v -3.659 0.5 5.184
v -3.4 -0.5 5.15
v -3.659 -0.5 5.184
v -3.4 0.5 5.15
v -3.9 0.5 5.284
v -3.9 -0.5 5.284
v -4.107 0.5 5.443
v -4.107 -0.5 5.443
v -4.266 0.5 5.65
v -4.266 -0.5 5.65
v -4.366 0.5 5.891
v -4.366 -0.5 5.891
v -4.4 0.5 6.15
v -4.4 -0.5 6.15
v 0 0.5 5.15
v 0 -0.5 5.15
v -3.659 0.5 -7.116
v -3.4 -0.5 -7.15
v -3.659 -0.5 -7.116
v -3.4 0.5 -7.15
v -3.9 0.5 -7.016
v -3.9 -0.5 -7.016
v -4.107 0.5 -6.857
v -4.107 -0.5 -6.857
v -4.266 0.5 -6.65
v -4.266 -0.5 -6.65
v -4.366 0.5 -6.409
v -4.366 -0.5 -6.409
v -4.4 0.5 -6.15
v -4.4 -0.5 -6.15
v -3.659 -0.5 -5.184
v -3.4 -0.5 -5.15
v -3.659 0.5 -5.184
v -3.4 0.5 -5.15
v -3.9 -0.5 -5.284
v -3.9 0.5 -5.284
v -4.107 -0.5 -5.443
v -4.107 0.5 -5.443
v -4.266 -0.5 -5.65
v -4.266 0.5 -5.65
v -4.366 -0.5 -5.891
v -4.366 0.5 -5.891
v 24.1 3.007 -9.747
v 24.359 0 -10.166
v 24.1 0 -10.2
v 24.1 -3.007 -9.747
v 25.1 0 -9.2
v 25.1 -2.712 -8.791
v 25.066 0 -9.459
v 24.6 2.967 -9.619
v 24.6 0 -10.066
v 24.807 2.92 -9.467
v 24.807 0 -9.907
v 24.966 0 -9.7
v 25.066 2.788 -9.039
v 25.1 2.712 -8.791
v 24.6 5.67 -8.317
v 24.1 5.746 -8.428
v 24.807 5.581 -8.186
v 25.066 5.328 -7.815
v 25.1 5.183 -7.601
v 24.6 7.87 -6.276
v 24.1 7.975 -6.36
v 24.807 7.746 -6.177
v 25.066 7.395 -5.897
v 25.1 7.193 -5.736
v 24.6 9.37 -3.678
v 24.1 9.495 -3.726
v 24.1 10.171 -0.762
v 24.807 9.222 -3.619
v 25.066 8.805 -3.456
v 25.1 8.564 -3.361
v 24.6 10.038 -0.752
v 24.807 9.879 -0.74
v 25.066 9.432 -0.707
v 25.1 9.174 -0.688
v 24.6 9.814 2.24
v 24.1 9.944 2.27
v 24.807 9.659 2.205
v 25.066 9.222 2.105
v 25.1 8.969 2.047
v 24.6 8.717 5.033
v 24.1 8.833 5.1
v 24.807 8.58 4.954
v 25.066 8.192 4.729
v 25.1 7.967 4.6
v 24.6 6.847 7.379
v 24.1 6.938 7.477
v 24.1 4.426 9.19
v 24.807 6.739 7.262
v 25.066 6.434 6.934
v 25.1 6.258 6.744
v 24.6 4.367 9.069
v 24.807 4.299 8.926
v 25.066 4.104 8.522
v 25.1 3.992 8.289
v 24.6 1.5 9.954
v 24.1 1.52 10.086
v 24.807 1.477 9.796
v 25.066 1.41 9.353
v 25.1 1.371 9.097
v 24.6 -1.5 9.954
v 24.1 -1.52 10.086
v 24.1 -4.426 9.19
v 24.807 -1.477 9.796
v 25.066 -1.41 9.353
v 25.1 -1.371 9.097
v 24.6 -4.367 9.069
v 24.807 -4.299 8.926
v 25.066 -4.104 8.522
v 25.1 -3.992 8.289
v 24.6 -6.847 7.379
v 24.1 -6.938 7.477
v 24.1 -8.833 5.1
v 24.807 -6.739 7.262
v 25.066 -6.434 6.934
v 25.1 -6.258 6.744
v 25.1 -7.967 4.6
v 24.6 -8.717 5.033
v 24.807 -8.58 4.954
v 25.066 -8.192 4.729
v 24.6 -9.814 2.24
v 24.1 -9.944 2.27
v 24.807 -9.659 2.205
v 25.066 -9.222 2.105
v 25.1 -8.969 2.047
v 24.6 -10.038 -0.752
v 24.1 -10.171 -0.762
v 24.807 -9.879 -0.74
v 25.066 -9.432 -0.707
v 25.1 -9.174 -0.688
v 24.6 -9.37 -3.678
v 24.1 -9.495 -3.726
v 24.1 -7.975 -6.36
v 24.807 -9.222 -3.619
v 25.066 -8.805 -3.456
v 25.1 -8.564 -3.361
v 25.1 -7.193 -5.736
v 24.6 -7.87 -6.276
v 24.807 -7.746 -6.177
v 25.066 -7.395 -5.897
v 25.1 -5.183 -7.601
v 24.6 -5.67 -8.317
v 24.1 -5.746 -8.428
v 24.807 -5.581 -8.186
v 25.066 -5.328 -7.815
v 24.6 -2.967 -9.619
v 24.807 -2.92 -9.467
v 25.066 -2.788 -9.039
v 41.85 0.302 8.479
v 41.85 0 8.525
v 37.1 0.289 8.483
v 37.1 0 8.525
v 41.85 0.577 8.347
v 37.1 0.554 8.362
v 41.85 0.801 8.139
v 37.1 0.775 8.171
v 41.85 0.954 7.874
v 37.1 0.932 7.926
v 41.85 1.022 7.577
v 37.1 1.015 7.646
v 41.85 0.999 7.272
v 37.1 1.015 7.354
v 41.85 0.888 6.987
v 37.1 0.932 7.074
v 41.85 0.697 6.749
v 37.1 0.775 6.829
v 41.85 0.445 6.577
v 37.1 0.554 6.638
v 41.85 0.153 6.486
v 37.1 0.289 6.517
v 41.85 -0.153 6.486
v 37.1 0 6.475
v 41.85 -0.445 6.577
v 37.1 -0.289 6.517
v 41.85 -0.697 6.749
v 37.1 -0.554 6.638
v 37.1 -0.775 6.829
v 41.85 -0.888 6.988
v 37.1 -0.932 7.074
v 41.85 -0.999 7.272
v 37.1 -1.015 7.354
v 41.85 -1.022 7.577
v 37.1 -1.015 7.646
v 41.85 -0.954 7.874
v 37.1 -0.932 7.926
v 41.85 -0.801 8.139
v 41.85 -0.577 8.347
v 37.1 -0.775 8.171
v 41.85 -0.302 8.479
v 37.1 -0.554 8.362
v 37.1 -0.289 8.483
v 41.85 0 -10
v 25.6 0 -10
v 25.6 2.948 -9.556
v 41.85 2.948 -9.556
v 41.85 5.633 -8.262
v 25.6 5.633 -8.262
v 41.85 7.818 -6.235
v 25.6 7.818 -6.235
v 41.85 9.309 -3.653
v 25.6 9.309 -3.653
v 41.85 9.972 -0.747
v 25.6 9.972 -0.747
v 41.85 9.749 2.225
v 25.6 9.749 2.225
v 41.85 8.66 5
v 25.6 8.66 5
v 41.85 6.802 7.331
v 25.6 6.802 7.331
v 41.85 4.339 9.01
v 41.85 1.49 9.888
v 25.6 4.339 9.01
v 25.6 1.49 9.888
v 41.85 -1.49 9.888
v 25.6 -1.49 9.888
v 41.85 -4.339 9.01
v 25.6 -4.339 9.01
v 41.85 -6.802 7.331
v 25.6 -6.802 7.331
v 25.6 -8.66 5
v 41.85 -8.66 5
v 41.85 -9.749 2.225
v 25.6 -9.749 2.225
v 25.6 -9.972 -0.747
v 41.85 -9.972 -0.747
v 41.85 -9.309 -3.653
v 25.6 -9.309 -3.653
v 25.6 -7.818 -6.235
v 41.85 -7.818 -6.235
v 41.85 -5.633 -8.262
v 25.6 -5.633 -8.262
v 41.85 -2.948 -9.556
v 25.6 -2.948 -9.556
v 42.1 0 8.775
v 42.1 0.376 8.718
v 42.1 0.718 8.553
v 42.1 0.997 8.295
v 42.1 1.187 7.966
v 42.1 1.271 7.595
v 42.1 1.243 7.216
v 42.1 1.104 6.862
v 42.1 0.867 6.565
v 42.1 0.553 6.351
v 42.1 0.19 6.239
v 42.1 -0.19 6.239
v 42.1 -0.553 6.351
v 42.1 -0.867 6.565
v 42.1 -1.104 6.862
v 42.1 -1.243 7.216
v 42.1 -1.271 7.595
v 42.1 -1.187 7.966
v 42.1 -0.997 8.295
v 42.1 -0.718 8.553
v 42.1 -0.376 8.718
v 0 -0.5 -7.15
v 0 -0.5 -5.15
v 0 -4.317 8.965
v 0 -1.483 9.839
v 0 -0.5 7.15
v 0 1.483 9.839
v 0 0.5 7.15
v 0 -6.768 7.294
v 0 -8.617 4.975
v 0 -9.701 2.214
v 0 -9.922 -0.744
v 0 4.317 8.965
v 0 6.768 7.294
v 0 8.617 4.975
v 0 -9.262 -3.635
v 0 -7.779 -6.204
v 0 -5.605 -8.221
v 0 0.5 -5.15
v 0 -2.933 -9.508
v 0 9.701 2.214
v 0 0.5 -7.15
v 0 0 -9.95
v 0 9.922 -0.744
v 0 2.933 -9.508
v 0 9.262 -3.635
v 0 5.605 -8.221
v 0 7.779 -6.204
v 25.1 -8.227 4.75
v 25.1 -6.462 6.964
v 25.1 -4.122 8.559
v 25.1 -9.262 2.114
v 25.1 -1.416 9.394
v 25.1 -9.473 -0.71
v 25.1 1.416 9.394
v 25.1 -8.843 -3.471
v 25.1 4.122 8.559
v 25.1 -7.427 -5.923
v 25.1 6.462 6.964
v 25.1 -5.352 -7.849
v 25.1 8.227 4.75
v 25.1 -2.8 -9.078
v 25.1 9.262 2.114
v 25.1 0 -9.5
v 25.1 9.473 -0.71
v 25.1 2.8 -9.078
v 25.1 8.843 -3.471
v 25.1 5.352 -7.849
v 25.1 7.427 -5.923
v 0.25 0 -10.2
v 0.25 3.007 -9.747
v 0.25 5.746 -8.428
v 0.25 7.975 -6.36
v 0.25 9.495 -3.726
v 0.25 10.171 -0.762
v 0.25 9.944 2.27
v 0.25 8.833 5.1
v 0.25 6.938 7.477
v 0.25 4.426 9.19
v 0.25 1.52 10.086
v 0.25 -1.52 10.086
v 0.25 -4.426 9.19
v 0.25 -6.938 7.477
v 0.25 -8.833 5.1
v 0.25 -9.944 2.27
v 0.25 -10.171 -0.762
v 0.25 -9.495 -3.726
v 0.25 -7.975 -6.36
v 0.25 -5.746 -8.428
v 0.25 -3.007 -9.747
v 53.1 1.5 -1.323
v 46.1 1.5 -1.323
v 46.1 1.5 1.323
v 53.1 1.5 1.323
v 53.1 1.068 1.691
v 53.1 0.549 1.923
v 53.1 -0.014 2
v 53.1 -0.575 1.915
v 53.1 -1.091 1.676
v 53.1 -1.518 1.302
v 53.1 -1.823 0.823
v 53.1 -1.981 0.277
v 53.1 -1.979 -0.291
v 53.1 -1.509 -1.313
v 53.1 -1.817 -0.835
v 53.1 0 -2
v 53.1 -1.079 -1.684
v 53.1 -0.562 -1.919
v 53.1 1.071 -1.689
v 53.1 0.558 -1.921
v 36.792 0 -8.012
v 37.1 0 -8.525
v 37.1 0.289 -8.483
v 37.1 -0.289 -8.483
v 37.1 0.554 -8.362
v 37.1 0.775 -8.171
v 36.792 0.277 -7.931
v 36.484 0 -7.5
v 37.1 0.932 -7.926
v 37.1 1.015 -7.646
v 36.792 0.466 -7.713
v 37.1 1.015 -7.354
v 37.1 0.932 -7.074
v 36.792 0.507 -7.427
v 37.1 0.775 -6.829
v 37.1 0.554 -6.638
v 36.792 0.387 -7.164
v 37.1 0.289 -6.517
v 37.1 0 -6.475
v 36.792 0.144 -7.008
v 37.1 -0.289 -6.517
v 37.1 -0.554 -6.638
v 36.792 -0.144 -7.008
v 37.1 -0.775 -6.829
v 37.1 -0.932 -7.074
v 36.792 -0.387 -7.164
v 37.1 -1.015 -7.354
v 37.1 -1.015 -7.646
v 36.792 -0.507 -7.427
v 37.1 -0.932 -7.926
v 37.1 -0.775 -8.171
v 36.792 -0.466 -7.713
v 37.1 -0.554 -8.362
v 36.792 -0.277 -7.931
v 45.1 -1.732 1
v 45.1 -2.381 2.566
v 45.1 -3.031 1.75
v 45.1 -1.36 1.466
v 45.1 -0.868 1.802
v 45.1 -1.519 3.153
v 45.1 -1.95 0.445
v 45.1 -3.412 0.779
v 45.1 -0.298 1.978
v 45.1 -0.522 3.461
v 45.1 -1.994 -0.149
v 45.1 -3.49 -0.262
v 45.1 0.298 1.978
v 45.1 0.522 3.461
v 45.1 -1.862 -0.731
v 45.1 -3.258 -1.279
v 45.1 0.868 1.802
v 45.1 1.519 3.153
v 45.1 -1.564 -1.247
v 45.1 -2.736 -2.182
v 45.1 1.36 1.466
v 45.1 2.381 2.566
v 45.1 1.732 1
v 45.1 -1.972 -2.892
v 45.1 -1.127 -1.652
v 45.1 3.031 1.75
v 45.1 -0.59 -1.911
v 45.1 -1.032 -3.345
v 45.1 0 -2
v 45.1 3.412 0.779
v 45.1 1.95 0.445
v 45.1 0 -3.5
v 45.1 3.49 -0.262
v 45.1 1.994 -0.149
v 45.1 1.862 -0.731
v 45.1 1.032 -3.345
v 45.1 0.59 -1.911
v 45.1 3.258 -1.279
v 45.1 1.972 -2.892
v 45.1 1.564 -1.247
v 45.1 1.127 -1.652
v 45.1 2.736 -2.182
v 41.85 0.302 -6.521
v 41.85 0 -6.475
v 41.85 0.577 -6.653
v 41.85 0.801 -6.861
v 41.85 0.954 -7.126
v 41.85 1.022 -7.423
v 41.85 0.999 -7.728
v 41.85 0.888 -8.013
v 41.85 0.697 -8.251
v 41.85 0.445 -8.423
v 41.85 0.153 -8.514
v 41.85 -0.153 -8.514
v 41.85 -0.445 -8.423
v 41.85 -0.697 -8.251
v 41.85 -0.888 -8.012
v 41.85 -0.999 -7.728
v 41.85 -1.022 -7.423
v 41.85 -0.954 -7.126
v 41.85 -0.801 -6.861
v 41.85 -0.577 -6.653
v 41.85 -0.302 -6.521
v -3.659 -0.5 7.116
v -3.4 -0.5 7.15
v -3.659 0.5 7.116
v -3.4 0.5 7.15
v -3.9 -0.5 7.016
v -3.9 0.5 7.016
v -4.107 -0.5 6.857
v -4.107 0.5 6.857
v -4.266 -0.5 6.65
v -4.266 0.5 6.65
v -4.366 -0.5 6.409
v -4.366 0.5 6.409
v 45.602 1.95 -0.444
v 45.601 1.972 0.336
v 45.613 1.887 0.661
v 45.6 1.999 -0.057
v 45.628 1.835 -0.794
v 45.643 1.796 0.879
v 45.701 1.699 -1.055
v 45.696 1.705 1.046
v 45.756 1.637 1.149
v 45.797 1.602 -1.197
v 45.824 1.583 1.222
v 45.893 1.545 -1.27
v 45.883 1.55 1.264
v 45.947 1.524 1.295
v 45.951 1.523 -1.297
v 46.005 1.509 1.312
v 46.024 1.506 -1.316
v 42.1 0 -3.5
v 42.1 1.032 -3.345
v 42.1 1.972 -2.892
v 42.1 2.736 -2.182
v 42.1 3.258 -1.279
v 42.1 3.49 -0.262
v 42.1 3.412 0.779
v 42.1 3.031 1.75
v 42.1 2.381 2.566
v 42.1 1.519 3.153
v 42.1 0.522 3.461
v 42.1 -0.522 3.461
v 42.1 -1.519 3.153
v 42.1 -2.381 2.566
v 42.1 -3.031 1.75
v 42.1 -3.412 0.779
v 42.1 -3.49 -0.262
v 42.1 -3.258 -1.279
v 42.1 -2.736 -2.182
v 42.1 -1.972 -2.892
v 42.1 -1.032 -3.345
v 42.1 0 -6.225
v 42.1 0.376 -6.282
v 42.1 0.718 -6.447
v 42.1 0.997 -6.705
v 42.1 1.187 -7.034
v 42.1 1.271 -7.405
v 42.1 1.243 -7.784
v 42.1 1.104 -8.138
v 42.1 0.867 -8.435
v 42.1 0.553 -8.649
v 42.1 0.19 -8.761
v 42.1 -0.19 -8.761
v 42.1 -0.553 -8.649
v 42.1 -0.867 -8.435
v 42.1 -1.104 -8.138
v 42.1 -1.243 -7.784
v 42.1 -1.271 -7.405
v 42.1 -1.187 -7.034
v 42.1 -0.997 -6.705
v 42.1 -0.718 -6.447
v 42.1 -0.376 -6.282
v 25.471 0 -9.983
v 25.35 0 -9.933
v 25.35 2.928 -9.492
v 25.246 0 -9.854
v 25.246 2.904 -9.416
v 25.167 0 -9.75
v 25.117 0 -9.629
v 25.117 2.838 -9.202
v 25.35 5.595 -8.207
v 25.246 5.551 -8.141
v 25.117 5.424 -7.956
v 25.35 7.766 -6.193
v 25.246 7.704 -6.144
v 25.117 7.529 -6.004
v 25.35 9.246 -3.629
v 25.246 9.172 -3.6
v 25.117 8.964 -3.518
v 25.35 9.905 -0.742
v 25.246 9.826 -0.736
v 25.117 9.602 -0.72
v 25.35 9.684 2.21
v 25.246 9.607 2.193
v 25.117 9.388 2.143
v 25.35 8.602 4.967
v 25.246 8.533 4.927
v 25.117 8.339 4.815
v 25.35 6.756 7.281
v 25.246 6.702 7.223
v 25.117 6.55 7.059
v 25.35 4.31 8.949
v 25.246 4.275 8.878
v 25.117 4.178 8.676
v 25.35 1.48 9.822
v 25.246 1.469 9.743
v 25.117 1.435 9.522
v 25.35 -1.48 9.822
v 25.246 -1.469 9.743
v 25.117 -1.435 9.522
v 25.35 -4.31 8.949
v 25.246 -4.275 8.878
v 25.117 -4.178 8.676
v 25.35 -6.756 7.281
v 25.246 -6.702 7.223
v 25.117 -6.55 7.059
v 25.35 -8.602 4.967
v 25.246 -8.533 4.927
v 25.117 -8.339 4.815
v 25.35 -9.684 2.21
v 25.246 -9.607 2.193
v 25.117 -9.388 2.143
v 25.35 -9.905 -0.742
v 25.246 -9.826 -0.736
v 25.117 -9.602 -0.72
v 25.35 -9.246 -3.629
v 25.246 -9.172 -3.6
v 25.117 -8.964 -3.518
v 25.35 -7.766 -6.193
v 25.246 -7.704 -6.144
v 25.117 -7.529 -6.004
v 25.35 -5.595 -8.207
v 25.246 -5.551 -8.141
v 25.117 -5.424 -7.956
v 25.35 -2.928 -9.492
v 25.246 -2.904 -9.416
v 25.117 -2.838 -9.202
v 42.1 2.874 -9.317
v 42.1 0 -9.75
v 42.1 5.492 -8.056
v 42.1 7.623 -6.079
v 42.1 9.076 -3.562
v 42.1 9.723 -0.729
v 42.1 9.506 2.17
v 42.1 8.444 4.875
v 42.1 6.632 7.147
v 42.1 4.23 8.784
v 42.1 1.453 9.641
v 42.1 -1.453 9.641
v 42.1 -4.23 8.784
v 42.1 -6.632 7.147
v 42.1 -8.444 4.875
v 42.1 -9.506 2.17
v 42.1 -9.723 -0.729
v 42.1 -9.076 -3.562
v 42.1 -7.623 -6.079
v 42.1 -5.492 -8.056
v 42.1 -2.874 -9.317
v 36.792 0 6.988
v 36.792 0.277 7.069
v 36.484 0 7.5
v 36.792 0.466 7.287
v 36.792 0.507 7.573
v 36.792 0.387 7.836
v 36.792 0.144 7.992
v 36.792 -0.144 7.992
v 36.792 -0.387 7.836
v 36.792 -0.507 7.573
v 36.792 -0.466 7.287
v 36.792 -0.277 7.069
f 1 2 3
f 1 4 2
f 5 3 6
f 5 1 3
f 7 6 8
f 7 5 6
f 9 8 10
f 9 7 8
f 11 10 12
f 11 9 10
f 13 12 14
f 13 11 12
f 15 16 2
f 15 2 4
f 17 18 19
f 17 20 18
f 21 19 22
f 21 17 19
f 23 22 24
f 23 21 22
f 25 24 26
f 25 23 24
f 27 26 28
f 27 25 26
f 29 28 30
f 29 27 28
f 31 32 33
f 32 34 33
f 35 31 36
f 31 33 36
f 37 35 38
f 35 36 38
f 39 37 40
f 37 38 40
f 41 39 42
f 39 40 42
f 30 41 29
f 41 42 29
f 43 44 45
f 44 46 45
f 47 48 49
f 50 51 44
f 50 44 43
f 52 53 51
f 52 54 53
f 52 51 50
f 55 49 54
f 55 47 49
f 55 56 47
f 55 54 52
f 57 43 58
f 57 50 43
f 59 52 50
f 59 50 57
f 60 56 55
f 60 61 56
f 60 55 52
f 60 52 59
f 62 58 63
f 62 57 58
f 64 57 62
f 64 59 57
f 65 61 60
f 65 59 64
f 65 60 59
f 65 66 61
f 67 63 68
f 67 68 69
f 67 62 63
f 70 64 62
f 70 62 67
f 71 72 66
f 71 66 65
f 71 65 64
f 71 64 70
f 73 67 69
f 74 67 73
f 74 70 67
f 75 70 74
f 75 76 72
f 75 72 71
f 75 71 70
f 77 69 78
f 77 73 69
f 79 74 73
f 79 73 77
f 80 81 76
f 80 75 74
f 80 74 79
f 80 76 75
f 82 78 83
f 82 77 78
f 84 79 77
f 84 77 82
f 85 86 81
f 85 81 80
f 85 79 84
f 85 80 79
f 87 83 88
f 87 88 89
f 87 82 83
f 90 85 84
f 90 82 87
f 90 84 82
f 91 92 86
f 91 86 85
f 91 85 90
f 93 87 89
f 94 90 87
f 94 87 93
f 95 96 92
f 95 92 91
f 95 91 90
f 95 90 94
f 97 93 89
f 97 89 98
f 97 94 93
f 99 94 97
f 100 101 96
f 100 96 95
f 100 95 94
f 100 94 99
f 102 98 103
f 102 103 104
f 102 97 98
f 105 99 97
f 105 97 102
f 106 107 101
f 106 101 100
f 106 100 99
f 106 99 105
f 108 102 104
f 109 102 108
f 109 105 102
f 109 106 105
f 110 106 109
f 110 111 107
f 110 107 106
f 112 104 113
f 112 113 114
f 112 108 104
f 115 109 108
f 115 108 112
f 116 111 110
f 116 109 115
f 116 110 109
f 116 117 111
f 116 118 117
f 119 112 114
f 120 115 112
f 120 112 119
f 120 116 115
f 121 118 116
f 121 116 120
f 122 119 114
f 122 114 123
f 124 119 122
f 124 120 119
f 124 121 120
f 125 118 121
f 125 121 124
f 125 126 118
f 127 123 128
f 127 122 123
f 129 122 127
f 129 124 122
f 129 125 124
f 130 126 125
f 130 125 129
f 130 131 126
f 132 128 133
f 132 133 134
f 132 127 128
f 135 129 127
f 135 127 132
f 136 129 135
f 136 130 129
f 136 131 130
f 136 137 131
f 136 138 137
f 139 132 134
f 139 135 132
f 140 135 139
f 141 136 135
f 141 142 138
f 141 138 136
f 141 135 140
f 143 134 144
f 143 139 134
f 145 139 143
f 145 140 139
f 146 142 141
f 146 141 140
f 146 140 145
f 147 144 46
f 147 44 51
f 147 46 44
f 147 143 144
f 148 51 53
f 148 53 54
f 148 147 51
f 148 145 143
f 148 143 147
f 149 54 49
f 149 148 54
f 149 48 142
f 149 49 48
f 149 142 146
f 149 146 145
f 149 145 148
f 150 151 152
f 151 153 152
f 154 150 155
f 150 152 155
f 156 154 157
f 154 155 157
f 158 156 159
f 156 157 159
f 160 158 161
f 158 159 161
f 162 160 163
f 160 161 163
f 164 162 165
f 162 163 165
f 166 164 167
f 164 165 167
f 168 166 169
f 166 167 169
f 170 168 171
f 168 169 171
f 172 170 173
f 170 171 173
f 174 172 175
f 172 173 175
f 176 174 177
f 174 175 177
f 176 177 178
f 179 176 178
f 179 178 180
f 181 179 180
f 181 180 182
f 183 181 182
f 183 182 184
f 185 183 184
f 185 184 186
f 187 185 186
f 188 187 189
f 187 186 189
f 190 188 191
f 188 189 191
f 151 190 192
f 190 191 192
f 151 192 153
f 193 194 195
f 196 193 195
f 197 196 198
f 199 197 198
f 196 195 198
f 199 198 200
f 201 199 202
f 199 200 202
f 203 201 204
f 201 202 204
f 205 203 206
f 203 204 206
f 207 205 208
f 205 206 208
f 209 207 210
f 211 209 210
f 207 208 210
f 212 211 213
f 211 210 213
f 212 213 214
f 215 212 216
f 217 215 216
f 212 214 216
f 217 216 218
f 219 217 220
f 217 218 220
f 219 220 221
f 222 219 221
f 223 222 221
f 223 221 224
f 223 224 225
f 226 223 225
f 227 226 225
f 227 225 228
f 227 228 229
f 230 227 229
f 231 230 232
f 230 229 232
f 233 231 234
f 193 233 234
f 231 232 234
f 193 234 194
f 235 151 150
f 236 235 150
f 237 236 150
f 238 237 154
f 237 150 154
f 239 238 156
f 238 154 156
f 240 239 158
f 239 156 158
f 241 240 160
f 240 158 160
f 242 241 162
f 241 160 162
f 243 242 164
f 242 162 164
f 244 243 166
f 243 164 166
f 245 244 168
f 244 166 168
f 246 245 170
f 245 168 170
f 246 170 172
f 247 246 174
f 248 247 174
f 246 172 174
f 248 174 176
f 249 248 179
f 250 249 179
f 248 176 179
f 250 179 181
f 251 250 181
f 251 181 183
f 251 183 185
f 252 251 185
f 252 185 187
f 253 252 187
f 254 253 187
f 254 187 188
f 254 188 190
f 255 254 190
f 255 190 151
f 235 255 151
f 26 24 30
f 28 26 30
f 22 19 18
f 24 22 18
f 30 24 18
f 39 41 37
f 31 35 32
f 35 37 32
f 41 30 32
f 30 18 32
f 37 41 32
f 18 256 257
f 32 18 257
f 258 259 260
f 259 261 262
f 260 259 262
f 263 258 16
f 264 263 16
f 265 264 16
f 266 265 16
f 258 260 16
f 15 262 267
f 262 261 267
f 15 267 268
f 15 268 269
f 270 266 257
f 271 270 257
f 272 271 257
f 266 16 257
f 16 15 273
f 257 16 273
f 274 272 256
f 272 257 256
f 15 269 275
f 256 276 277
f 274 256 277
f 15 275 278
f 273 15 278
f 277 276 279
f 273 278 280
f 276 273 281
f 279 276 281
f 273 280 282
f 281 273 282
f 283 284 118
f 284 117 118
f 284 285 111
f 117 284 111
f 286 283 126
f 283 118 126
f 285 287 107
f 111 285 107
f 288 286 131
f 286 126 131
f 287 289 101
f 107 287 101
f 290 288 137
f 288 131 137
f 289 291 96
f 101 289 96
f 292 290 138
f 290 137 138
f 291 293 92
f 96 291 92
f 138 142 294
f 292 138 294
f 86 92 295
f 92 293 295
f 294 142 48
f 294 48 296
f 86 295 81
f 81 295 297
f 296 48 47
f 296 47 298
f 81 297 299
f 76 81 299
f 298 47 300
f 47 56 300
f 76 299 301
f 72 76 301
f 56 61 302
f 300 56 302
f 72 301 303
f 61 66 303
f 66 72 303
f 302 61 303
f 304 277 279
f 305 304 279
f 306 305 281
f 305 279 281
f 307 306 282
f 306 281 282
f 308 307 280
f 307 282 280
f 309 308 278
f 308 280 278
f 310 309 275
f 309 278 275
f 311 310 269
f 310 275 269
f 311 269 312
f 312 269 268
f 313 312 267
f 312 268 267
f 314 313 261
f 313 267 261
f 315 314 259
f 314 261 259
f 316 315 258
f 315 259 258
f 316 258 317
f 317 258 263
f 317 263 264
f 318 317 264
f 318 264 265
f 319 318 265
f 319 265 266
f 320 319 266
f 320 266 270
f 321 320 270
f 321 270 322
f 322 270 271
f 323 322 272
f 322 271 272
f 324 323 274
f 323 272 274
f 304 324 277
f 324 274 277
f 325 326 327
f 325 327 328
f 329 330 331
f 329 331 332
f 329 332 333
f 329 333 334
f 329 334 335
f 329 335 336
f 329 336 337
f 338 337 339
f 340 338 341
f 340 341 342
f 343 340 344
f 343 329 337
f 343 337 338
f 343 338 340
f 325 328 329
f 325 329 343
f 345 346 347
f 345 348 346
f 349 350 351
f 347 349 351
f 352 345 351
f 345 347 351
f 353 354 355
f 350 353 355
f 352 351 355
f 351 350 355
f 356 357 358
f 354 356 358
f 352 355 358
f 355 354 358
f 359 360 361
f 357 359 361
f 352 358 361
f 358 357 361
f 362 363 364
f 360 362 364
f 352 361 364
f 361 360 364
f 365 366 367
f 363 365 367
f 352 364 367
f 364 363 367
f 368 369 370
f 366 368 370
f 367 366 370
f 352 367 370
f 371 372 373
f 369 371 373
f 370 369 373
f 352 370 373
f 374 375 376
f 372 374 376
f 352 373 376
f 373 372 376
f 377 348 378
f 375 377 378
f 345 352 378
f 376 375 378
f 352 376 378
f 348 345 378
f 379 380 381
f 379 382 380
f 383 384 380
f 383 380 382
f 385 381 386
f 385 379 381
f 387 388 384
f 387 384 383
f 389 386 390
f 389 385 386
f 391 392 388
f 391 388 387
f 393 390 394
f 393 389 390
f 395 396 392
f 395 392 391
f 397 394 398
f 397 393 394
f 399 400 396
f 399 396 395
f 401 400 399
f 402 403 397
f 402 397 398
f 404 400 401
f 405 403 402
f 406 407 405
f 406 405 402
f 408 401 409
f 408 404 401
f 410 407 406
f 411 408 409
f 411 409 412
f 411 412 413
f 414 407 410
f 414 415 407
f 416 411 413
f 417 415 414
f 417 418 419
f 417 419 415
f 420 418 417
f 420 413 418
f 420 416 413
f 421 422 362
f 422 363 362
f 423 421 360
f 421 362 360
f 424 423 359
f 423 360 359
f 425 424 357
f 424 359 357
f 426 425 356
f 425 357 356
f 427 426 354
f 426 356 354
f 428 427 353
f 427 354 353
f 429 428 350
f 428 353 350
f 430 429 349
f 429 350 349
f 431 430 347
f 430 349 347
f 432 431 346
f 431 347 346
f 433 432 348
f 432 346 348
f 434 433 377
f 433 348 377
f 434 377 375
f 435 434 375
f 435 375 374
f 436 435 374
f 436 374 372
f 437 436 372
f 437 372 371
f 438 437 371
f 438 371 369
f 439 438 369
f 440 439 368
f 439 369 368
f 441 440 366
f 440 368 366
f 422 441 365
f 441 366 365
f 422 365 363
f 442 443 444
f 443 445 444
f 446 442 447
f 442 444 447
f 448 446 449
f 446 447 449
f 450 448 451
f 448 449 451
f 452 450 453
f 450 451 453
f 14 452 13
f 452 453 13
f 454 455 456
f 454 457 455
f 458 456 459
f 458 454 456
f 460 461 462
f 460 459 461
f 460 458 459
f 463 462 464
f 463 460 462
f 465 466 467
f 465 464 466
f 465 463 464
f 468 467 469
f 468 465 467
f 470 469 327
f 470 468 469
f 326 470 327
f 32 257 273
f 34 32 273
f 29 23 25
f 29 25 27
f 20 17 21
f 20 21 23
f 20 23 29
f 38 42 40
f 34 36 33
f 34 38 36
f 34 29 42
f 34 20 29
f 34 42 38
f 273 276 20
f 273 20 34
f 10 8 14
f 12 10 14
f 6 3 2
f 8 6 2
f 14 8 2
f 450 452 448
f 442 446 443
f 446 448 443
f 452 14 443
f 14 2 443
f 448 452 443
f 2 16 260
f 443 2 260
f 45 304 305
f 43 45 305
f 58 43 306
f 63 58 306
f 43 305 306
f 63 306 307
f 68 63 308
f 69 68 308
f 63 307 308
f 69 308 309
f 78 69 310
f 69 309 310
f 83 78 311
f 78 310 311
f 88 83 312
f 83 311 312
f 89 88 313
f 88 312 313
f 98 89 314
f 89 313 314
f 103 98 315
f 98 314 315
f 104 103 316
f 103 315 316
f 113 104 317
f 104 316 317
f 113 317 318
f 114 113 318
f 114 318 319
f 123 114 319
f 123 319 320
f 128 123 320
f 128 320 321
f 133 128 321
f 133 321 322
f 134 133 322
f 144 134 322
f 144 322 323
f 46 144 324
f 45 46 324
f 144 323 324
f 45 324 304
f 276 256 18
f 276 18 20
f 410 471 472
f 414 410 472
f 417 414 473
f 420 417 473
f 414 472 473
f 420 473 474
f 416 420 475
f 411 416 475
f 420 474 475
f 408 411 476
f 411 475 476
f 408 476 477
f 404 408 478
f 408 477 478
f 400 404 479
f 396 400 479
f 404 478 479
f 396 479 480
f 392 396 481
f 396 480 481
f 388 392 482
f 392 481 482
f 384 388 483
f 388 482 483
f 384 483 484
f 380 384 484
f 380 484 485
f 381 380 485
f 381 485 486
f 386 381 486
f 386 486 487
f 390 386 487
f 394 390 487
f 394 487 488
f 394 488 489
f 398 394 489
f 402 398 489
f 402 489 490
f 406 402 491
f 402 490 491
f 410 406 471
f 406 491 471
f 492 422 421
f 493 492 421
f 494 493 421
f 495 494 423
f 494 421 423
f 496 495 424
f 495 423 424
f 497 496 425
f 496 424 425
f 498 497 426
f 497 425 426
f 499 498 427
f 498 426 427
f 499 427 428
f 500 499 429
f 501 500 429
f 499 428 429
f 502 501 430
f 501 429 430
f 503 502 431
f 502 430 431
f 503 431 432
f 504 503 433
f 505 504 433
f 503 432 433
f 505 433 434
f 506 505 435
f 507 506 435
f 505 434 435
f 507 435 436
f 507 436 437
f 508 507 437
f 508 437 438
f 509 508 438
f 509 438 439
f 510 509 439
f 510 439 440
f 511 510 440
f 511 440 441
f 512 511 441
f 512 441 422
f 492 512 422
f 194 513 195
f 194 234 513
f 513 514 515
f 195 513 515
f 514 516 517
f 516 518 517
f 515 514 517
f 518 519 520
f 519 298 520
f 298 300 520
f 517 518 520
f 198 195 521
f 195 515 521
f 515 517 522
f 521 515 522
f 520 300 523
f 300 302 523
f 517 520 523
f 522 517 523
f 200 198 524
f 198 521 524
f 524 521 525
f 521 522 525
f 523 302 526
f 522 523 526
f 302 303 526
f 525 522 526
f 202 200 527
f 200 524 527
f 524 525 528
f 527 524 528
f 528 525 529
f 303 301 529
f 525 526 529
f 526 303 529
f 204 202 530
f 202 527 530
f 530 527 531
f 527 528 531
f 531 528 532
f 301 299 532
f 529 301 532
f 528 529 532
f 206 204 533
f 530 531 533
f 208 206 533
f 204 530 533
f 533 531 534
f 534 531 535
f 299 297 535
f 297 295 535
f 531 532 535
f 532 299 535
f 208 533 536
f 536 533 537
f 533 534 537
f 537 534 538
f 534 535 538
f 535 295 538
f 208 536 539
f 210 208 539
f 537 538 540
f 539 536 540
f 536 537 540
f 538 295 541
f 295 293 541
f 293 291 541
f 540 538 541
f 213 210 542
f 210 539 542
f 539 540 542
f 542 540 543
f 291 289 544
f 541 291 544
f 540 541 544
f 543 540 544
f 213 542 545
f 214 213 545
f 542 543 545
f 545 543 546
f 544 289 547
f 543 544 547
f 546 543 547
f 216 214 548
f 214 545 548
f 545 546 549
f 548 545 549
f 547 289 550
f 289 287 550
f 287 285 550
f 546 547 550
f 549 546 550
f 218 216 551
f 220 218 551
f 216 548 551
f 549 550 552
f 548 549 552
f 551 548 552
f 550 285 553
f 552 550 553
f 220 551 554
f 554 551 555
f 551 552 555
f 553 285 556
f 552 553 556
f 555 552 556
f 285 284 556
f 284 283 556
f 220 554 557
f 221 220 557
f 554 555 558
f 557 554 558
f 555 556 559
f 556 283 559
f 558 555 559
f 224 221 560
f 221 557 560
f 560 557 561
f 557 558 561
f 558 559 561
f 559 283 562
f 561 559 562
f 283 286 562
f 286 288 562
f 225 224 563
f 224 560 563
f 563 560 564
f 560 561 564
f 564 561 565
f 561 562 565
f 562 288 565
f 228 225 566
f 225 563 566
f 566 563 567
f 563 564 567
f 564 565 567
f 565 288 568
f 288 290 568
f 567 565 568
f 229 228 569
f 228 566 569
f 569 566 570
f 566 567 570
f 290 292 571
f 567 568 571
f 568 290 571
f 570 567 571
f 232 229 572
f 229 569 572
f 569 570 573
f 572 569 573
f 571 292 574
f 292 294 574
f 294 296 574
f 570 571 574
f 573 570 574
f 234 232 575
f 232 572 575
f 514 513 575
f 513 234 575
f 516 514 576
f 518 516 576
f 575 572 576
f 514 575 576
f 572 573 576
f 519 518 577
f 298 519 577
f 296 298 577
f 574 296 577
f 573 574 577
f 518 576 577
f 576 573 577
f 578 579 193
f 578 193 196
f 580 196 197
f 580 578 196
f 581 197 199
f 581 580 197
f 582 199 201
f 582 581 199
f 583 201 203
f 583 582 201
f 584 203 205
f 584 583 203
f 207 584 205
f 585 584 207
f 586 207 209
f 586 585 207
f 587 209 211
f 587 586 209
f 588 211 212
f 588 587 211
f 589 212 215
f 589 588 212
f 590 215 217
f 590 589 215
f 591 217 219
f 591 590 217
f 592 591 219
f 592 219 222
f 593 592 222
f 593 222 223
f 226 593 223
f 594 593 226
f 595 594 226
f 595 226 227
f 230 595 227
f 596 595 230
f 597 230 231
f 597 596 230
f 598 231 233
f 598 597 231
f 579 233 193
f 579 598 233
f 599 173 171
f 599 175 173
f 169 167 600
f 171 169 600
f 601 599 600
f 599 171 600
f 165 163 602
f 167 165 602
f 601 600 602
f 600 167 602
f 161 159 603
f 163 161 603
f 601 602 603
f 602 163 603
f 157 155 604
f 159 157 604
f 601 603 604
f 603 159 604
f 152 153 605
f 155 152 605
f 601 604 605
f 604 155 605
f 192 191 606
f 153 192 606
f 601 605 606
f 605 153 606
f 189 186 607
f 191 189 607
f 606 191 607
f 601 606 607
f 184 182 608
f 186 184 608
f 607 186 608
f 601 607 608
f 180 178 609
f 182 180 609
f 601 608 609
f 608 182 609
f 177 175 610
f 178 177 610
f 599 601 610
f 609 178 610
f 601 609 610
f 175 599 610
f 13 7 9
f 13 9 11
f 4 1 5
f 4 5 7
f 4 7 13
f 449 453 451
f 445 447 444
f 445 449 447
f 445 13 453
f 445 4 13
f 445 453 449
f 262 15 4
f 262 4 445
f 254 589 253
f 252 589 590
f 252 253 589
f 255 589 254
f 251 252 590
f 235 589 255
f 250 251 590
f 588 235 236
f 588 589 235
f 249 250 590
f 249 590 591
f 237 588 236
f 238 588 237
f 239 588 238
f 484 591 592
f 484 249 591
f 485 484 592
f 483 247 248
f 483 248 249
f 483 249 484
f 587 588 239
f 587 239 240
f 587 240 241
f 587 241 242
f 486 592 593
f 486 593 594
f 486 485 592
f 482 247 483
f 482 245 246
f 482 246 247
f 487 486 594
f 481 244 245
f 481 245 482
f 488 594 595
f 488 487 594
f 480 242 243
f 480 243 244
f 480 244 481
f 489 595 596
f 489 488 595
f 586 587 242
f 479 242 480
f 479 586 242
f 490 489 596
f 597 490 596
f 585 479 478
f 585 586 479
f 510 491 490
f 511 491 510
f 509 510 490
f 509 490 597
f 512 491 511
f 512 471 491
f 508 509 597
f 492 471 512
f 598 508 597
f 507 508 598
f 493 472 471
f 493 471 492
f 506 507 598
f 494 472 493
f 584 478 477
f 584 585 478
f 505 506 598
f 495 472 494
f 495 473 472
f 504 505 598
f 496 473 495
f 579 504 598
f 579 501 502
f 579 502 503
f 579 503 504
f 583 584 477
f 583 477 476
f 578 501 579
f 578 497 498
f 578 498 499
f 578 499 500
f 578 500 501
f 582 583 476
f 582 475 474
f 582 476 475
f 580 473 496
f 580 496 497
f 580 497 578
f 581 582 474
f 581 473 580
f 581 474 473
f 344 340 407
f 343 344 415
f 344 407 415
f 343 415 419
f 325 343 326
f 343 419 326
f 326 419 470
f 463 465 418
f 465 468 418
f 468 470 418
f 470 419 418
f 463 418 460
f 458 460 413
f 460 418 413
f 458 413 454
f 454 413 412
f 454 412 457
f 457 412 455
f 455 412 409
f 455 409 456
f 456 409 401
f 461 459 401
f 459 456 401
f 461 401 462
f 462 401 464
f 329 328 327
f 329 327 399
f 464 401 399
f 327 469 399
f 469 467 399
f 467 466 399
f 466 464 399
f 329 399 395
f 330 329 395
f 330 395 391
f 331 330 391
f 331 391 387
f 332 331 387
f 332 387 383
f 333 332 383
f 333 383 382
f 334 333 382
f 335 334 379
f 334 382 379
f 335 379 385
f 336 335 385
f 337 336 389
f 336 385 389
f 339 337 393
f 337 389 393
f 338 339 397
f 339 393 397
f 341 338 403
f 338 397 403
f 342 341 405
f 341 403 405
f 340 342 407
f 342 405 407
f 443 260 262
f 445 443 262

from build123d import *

# Parameters (mm, degrees)
SKETCH1_R                          = 10.2
BOSS_EXTRUDE1_DEPTH                = 25.1
FILLET1_R                          = 1
SKETCH2_R                          = 10
BOSS_EXTRUDE2_DEPTH                = 17
FILLET2_R                          = 0.5
CHAMFER1_SIZE                      = 0.25
SKETCH3_R                          = 3.5
BOSS_EXTRUDE3_DEPTH                = 3
SKETCH4_R                          = 2
BOSS_EXTRUDE4_DEPTH                = 11
CUT_EXTRUDE1_DEPTH                 = 56.024449111
CUT_EXTRUDE1_DEPTH_BACK            = 56.024449111
M2_5X0_45_TAPPED_HOLE1_D           = 2.05
M2_5X0_45_TAPPED_HOLE1_DEPTH       = 5
M2_5X0_45_TAPPED_HOLE1_CSINK_D     = 2.55
M2_5X0_45_TAPPED_HOLE1_CSINK_ANGLE = 90
M2_5X0_45_TAPPED_HOLE1_TIP         = 0.615882135
SKETCH9_W                          = 2
SKETCH9_H                          = 1
BOSS_EXTRUDE5_DEPTH                = 4.4
FILLET3_R                          = 1


with BuildPart() as part:
    # Sketch1 → Boss-Extrude1 (new body)
    with BuildSketch(Plane(origin=(0, 0, 0), x_dir=(0, 0, -1), z_dir=(1, 0, 0))):
        Circle(SKETCH1_R)
    extrude(amount=BOSS_EXTRUDE1_DEPTH)

    # Fillet1
    fillet1_edges = [part.edges().sort_by_distance(p)[0] for p in [
        (25.1, 0, 10.2),
    ]]
    fillet(fillet1_edges, radius=FILLET1_R)

    # Sketch2 → Boss-Extrude2 (add)
    with BuildSketch(Plane(origin=(25.1, 0, 0), x_dir=(0, 0, -1), z_dir=(1, 0, 0))):
        Circle(SKETCH2_R)
    extrude(amount=BOSS_EXTRUDE2_DEPTH)

    # Fillet2
    fillet2_edges = [part.edges().sort_by_distance(p)[0] for p in [
        (25.1, 0, 10),
    ]]
    fillet(fillet2_edges, radius=FILLET2_R)

    # Chamfer1
    chamfer1_edges = [part.edges().sort_by_distance(p)[0] for p in [
        (0, 0, 10.2),
        (42.1, 0, 10),
    ]]
    chamfer(chamfer1_edges, length=CHAMFER1_SIZE)

    # Sketch3 → Boss-Extrude3 (add)
    with BuildSketch(Plane(origin=(42.1, 0, 0), x_dir=(0, 0, -1), z_dir=(1, 0, 0))):
        Circle(SKETCH3_R)
    extrude(amount=BOSS_EXTRUDE3_DEPTH)

    # Sketch4 → Boss-Extrude4 (add)
    with BuildSketch(Plane(origin=(42.1, 0, 0), x_dir=(0, 0, -1), z_dir=(1, 0, 0))):
        Circle(SKETCH4_R)
    extrude(amount=BOSS_EXTRUDE4_DEPTH)

    # Sketch6 → Cut-Extrude1 (cut, two sides: drawn at the far end of the back side and taken through both)
    with BuildSketch(Plane.XY.offset(-CUT_EXTRUDE1_DEPTH_BACK)):
        with BuildLine():
            Line((53.1, 2), (45.6, 2))
            ThreePointArc((45.6, 2), (45.746446609, 1.646446609), (46.1, 1.5))
            Line((46.1, 1.5), (53.1, 1.5))
            Line((53.1, 1.5), (53.1, 2))
        make_face()
    extrude(amount=CUT_EXTRUDE1_DEPTH + CUT_EXTRUDE1_DEPTH_BACK, mode=Mode.SUBTRACT)

    # M2.5x0.45 Tapped Hole1
    with Locations(Plane(origin=(42.1, 0, 0), x_dir=(0, 0, -1), z_dir=(1, 0, 0))):
        with Locations((-7.5, 0), (7.5, 0)):
            CounterSinkHole(M2_5X0_45_TAPPED_HOLE1_D / 2, M2_5X0_45_TAPPED_HOLE1_CSINK_D / 2, depth=M2_5X0_45_TAPPED_HOLE1_DEPTH, counter_sink_angle=M2_5X0_45_TAPPED_HOLE1_CSINK_ANGLE)
            with Locations((0, 0, -(M2_5X0_45_TAPPED_HOLE1_DEPTH + M2_5X0_45_TAPPED_HOLE1_TIP / 2))):  # 118° drill point
                Cone(0, M2_5X0_45_TAPPED_HOLE1_D / 2, M2_5X0_45_TAPPED_HOLE1_TIP, mode=Mode.SUBTRACT)

    # Sketch9 → Boss-Extrude5 (add)
    with BuildSketch(Plane.ZY):
        with Locations((-6.15, 0)):
            Rectangle(SKETCH9_W, SKETCH9_H)
        with Locations((6.15, 0)):
            Rectangle(SKETCH9_W, SKETCH9_H)
    extrude(amount=BOSS_EXTRUDE5_DEPTH)

    # Fillet3
    fillet3_edges = [part.edges().sort_by_distance(p)[0] for p in [
        (-4.4, 0, 7.15),
        (-4.4, 0, 5.15),
        (-4.4, 0, -5.15),
        (-4.4, 0, -7.15),
    ]]
    fillet(fillet3_edges, radius=FILLET3_R - 0.0001)  # a hair under: the kernel refuses the full size


solid = part.part
